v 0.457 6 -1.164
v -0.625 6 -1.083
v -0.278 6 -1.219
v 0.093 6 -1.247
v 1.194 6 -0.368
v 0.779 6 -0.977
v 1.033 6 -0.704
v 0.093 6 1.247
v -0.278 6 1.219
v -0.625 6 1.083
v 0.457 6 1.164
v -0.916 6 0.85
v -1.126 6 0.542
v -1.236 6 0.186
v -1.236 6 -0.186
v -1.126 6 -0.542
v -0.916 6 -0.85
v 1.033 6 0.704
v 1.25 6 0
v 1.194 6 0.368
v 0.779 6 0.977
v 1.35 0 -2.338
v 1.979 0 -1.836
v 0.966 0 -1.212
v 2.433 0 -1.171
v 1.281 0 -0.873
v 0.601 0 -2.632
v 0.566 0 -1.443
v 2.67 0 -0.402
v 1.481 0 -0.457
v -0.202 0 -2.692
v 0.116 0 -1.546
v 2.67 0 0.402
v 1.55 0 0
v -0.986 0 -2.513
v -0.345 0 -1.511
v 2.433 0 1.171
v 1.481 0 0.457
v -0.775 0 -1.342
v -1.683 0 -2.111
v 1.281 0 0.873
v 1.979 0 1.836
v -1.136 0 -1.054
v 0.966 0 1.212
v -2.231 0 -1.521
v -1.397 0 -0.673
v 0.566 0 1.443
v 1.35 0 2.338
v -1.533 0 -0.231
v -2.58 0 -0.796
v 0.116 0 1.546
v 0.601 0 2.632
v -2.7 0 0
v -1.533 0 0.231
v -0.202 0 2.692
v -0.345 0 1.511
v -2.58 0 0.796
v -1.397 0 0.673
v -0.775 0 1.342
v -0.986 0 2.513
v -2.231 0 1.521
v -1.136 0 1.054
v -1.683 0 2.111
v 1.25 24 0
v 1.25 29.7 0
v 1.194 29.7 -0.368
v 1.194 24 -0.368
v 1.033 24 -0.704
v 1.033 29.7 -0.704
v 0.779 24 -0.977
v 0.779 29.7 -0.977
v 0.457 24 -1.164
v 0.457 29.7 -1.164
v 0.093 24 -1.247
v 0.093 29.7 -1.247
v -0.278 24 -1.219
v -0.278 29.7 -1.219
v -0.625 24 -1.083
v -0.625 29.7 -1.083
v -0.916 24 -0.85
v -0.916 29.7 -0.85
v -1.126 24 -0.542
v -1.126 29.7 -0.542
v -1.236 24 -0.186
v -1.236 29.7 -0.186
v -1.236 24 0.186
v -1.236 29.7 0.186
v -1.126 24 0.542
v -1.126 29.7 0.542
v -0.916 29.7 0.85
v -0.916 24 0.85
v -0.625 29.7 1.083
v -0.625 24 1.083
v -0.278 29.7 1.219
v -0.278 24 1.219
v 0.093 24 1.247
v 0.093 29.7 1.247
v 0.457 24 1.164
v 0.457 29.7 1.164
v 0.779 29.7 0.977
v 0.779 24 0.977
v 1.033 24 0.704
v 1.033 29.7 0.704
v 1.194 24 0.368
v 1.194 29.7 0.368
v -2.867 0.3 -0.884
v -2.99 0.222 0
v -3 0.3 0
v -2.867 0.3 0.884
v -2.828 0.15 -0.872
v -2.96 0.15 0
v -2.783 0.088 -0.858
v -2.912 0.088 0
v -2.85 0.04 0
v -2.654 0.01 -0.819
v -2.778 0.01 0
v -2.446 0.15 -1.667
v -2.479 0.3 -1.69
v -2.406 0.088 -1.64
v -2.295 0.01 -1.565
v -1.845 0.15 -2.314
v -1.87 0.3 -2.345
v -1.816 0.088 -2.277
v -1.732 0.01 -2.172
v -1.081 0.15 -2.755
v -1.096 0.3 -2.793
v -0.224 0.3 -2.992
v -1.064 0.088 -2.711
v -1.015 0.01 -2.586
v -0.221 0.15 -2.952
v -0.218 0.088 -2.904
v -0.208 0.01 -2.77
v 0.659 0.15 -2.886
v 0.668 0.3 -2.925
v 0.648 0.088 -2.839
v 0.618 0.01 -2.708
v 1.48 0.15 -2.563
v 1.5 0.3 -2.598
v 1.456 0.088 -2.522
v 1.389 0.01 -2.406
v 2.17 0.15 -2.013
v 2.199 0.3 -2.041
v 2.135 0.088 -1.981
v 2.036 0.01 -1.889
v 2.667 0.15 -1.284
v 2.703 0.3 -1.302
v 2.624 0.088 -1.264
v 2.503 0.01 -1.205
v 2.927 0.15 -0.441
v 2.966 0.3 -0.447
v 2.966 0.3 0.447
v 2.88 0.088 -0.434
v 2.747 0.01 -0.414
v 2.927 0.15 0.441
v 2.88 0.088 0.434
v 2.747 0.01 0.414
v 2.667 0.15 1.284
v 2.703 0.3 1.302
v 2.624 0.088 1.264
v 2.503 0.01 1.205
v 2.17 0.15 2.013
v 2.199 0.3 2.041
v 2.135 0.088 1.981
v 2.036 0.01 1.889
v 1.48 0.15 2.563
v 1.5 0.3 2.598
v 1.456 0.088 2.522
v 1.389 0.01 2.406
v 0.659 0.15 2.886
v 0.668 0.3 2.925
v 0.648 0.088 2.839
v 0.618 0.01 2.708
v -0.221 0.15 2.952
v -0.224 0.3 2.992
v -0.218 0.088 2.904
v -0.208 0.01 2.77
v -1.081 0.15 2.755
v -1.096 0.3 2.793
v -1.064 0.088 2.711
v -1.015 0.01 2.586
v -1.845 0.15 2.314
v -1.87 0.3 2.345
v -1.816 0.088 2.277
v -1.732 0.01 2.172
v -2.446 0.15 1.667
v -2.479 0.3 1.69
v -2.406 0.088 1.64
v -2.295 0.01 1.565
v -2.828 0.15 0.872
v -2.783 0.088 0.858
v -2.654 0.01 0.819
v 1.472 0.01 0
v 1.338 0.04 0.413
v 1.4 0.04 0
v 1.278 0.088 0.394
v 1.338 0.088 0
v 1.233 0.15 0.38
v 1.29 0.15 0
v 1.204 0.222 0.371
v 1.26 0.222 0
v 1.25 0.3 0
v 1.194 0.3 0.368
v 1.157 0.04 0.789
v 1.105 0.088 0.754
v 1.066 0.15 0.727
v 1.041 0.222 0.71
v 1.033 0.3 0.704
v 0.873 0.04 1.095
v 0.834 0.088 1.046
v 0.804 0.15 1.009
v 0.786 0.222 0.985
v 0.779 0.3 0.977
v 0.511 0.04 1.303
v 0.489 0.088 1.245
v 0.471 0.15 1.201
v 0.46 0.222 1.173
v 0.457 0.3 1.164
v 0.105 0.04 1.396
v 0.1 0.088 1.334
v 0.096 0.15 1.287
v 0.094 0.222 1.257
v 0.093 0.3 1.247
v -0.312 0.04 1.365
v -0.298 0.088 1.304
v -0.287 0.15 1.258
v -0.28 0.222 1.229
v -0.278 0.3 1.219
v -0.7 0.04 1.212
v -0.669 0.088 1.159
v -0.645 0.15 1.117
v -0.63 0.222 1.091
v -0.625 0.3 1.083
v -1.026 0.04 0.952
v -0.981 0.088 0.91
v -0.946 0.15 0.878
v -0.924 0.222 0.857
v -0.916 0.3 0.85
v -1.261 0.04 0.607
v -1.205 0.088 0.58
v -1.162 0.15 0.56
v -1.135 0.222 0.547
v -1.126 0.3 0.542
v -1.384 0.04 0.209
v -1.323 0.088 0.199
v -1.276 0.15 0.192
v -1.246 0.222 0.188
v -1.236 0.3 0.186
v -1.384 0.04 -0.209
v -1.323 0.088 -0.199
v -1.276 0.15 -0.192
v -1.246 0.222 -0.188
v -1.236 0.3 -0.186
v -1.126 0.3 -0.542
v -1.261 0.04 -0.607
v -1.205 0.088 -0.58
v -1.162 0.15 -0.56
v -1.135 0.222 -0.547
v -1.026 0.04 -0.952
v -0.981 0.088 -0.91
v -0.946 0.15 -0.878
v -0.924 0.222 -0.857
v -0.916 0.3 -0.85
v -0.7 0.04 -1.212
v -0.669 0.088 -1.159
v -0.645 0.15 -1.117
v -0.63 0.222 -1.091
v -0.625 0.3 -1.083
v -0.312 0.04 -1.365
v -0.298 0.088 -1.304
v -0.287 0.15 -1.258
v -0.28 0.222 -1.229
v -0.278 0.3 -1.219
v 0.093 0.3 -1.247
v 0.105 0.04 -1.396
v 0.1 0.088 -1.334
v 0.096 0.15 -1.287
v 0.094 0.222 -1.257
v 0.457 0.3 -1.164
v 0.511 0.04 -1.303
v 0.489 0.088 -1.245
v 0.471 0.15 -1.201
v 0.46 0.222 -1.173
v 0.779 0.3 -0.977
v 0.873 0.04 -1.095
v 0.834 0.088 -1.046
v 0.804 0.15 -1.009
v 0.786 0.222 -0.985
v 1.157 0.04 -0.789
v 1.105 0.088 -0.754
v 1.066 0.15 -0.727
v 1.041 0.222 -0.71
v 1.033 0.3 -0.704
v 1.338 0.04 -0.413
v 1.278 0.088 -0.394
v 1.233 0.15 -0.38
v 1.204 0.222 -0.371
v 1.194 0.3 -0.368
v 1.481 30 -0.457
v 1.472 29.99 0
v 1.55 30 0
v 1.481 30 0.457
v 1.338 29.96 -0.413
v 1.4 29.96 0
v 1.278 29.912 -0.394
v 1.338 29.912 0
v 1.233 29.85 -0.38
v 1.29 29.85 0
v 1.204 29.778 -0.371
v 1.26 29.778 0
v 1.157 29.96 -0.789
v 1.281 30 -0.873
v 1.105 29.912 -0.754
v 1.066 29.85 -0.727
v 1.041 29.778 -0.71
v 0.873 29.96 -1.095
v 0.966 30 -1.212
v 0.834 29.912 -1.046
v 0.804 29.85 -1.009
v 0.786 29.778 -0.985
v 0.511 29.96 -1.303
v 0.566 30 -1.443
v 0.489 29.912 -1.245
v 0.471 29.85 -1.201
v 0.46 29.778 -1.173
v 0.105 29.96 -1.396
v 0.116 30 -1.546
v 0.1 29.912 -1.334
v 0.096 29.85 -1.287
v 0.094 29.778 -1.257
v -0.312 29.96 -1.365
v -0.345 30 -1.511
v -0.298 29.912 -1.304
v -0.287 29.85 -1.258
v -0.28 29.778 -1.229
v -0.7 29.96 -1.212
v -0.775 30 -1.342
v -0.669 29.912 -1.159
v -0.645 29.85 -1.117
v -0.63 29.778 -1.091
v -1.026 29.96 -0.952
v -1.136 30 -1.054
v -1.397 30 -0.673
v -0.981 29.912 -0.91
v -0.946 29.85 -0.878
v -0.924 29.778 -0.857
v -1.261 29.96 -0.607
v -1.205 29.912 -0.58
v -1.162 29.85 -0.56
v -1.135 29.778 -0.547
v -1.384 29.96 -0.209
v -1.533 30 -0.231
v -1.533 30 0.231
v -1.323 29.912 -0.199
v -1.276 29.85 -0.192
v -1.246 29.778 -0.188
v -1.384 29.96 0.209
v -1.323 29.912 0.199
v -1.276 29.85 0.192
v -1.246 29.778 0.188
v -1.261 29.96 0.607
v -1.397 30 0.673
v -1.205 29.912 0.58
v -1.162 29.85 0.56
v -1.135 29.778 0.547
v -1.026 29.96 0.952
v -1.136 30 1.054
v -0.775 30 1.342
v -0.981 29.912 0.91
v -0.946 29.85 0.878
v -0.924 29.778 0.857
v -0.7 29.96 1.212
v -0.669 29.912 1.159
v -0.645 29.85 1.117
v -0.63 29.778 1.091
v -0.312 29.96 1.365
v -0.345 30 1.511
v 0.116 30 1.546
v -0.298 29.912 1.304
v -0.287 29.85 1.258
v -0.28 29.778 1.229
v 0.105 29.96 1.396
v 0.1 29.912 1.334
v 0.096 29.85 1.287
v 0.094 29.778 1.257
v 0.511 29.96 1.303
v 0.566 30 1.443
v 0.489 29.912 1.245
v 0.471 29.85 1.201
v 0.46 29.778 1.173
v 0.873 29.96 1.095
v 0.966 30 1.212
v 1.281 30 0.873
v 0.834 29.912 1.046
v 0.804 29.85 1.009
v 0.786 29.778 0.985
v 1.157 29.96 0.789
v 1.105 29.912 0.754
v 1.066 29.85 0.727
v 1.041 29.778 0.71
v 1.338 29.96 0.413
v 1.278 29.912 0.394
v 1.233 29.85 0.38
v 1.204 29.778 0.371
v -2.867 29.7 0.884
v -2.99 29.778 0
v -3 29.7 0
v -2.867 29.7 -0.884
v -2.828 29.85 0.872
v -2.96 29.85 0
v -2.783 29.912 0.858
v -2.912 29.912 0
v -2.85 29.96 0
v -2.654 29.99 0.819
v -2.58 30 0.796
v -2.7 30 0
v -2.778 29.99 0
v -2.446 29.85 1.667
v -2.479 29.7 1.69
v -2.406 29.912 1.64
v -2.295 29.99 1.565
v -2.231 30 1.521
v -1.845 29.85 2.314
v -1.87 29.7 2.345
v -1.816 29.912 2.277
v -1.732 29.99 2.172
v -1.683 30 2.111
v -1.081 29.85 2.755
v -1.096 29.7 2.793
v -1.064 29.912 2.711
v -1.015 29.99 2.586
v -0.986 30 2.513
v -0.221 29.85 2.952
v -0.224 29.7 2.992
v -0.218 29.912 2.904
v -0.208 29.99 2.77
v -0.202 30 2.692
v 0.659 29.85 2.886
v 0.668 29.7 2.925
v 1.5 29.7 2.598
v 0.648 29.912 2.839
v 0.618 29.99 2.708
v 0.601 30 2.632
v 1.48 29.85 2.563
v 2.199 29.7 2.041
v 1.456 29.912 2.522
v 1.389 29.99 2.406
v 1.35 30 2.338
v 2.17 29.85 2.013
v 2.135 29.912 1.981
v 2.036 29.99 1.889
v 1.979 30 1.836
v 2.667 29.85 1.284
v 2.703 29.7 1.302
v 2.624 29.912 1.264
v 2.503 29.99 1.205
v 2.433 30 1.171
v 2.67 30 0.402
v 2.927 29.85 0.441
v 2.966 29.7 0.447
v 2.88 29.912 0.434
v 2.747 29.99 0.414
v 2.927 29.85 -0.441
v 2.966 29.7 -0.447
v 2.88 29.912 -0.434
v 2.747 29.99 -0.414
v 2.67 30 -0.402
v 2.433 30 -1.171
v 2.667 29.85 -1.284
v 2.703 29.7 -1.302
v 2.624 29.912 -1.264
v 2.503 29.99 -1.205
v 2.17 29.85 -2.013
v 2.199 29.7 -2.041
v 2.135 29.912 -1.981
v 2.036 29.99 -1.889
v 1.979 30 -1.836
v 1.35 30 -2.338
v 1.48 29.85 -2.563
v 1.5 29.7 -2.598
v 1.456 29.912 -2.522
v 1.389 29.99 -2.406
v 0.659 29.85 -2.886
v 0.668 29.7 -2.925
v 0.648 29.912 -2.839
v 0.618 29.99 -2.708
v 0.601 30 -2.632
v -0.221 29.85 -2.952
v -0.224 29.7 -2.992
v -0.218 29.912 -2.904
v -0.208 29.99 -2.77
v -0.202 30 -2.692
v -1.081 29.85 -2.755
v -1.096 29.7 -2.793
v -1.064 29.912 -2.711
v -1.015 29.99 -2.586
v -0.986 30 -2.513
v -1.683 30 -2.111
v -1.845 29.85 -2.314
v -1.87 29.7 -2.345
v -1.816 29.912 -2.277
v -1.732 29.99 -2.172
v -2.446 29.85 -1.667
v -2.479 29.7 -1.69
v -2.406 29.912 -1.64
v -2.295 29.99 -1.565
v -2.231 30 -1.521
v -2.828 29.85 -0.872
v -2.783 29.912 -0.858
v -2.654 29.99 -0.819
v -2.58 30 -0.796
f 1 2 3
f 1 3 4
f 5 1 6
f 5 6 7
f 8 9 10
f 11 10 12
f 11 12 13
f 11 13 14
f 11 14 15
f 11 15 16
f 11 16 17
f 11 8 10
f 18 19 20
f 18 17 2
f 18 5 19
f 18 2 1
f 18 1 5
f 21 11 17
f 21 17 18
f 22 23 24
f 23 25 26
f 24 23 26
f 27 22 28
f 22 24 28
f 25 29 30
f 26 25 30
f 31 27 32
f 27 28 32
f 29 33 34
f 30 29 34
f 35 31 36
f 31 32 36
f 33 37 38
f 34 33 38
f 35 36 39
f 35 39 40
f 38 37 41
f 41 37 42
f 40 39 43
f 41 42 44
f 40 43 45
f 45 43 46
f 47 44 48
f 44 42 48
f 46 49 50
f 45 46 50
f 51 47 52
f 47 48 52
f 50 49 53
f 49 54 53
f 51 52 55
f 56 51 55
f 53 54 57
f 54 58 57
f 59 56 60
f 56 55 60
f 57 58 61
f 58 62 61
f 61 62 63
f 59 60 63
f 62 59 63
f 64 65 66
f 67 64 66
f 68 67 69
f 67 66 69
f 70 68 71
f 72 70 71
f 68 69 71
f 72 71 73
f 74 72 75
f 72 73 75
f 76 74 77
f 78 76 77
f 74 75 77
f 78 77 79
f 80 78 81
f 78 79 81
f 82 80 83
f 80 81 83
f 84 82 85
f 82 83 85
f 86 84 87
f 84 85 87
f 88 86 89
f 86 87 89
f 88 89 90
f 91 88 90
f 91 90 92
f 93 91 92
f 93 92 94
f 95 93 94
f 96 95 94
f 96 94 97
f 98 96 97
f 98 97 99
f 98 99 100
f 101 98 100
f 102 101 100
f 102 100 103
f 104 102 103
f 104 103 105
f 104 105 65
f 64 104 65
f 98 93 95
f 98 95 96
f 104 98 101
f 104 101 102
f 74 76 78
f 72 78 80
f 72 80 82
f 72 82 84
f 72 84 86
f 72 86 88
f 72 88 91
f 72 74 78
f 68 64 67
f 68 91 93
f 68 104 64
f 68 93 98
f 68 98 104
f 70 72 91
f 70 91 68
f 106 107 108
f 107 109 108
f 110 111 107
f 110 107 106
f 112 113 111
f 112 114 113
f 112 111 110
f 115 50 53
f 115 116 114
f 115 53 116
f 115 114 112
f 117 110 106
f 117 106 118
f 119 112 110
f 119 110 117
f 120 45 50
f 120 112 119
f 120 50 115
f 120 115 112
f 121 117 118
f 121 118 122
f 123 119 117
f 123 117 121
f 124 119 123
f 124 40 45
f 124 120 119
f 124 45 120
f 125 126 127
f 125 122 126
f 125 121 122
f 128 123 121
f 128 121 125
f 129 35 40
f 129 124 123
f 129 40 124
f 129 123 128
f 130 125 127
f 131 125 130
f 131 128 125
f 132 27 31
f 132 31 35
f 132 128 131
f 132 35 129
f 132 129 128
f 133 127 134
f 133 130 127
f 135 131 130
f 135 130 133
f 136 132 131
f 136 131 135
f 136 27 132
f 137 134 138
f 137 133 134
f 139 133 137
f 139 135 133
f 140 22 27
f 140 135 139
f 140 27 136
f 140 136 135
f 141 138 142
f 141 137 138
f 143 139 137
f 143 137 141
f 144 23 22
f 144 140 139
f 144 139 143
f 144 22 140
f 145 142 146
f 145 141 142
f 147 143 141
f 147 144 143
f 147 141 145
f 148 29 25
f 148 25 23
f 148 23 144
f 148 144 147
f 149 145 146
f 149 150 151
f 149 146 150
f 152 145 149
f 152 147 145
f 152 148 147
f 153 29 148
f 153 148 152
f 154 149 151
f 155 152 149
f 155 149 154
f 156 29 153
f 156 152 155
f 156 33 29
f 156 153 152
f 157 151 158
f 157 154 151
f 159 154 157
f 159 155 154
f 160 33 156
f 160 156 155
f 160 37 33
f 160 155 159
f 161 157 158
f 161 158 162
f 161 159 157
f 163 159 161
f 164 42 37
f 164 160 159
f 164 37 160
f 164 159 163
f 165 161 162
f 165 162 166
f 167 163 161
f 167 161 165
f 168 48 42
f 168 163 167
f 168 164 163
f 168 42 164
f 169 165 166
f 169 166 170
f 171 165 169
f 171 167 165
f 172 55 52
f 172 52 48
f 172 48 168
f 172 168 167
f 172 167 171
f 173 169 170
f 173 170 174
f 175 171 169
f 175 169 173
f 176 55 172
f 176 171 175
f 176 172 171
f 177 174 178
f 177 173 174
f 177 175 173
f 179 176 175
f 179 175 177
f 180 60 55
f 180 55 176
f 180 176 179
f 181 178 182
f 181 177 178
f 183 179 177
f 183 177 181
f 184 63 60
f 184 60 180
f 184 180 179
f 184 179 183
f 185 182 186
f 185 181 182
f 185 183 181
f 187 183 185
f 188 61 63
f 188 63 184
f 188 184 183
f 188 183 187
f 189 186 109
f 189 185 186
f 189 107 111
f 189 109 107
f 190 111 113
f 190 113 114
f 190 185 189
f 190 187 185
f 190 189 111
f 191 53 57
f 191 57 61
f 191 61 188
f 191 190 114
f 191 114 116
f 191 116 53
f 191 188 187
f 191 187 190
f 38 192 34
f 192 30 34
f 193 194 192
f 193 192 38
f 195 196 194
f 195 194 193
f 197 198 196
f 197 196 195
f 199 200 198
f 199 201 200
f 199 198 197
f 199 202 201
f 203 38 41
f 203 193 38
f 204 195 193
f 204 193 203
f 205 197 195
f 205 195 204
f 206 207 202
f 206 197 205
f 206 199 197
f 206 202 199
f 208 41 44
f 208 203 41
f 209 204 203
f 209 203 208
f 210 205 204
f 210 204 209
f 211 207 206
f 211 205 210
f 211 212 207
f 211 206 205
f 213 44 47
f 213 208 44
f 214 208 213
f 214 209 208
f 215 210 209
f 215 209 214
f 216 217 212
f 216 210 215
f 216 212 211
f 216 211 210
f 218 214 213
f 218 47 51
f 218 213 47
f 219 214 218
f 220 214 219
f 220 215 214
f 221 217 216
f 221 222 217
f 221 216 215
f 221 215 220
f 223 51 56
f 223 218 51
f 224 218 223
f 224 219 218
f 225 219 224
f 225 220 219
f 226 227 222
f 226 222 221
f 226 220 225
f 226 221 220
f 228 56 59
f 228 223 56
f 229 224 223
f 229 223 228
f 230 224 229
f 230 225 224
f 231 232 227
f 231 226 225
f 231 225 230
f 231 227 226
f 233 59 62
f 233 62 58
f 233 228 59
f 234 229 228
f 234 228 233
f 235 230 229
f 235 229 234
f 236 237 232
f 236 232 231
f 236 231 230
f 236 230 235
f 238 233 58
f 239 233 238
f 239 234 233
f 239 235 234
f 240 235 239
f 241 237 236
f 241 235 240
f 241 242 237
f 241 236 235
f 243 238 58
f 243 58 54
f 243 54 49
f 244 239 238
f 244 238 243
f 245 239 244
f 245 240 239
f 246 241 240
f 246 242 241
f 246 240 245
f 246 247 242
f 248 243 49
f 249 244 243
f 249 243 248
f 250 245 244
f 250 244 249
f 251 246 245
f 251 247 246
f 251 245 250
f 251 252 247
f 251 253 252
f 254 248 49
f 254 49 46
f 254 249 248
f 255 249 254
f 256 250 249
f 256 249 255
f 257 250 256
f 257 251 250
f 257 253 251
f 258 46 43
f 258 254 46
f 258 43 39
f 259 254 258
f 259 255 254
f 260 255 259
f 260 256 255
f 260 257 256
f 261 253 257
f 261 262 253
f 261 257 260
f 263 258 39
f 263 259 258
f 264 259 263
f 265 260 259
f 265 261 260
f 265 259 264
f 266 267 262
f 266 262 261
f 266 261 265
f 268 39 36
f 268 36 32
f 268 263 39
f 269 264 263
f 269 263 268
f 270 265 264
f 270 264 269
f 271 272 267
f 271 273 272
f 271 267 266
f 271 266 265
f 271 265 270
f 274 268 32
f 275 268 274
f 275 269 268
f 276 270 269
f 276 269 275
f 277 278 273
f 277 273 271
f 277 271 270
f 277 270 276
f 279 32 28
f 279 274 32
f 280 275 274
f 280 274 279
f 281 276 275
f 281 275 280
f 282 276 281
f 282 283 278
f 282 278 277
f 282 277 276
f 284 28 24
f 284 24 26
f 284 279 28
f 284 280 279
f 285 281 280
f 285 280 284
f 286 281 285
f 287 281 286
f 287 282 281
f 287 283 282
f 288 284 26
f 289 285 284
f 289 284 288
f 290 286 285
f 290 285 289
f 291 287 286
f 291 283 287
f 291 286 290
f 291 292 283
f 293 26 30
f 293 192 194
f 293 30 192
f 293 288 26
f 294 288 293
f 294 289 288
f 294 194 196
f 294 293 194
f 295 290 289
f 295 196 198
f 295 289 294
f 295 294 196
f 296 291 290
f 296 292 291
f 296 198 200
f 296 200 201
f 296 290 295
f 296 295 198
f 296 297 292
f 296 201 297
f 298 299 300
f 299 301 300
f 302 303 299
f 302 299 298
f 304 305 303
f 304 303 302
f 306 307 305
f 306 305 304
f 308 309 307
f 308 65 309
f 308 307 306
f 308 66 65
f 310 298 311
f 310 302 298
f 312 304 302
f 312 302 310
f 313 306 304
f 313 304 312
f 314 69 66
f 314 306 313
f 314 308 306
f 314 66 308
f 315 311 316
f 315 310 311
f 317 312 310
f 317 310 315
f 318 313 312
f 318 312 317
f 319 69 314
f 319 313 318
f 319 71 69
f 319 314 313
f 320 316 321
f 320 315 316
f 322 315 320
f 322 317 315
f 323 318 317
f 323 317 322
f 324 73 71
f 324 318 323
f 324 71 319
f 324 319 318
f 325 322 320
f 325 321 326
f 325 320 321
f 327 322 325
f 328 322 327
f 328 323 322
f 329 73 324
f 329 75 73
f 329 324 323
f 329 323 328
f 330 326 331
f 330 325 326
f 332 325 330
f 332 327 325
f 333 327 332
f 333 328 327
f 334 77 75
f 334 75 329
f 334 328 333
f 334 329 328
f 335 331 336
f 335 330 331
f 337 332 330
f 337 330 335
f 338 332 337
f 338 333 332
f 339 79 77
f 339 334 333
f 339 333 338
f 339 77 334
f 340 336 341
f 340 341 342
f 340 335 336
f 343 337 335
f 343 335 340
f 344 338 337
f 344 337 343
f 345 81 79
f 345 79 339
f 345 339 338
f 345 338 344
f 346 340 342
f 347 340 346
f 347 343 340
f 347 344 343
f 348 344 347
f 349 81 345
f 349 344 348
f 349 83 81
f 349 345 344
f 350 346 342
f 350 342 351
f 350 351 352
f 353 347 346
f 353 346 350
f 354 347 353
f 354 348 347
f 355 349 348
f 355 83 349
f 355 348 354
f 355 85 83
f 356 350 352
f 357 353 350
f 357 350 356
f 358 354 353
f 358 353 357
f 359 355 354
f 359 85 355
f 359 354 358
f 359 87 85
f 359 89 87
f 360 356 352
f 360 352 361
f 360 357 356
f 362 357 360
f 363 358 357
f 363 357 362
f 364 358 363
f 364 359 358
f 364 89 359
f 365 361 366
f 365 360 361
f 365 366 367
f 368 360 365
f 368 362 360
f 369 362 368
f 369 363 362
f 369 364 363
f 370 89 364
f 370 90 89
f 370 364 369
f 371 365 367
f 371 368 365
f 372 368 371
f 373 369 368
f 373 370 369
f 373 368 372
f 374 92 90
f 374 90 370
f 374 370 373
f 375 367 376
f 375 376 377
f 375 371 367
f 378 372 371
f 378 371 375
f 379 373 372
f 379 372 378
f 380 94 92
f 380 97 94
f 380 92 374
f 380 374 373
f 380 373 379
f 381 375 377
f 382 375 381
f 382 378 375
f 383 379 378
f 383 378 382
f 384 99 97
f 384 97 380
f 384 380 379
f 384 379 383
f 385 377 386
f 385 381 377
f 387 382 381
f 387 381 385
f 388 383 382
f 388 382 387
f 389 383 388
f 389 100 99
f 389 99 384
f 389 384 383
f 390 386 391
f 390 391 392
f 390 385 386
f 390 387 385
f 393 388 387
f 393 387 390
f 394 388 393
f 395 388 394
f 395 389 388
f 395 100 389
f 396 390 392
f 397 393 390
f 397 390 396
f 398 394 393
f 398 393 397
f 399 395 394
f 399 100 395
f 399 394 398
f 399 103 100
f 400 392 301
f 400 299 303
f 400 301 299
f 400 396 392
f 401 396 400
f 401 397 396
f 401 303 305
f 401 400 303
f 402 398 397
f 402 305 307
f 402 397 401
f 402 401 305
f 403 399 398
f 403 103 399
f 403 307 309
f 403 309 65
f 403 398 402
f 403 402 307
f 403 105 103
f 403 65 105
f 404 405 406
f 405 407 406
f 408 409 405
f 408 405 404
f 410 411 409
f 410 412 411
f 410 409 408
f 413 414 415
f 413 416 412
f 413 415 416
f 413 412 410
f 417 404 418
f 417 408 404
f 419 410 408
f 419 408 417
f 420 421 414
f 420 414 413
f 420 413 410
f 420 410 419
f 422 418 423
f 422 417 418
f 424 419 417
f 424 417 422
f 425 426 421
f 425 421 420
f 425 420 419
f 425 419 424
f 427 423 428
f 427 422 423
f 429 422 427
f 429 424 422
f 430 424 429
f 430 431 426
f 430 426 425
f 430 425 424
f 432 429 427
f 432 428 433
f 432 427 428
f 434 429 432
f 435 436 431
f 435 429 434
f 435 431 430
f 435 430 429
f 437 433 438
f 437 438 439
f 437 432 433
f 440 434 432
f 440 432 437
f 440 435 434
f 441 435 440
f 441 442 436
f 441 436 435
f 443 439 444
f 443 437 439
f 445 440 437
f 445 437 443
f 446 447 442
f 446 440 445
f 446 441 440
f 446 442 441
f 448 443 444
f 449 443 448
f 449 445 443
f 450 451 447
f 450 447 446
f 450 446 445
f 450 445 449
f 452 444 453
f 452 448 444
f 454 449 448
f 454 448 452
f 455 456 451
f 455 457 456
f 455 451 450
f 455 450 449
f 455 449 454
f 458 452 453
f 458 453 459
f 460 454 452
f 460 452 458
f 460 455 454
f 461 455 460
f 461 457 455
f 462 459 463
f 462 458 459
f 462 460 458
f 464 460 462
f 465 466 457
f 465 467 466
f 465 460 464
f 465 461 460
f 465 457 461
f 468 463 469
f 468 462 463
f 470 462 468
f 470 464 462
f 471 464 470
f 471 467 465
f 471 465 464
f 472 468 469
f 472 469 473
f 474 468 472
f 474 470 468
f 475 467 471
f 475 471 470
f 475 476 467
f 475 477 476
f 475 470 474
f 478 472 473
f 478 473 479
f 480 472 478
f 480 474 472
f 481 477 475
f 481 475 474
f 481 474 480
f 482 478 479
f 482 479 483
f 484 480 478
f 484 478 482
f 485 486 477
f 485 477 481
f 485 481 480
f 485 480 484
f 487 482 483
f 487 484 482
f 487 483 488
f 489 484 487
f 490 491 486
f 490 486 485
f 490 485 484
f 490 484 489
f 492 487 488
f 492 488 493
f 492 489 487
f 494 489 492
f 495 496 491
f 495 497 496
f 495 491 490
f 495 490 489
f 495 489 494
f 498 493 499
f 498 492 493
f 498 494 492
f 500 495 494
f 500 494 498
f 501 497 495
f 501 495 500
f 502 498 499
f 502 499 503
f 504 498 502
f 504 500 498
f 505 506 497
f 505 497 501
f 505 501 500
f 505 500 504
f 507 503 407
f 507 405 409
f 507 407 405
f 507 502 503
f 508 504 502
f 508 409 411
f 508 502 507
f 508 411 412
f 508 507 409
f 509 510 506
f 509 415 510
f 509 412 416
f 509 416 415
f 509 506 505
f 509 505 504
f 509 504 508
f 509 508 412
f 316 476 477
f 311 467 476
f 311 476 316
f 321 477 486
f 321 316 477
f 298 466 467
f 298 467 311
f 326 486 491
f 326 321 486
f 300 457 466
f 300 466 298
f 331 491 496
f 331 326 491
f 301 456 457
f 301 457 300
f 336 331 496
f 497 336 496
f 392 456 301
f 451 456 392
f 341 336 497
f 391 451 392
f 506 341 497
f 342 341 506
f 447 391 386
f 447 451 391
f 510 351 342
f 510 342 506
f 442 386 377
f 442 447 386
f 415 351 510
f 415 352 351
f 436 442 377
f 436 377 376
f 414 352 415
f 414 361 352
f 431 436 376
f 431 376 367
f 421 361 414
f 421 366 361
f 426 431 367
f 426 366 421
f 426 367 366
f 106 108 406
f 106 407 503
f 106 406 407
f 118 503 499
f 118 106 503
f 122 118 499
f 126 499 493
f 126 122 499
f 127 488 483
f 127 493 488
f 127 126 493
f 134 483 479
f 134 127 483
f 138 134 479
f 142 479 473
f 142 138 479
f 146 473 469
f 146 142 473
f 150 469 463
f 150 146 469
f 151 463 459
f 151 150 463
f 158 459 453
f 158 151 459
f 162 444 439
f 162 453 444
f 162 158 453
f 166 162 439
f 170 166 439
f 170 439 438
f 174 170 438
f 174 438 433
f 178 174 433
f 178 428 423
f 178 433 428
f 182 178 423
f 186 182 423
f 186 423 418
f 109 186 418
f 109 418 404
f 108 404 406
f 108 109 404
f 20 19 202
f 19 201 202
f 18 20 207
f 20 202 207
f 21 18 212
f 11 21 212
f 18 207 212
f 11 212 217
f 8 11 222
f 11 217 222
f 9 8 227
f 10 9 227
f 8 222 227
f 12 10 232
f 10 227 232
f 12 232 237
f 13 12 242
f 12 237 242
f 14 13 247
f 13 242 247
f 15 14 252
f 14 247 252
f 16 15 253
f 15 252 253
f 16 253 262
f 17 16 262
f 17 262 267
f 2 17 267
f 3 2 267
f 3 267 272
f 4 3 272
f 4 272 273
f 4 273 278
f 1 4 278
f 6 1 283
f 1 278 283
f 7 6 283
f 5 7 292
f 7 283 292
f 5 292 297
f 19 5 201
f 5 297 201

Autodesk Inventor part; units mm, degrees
ref_plane "YZ Plane" through (0, 0, 0) normal (1, 0, 0) x (0, 1, 0)
ref_plane "XZ Plane" through (0, 0, 0) normal (0, 1, 0) x (-1, 0, 0)
ref_plane "XY Plane" through (0, 0, 0) normal (0, 0, 1) x (1, 0, 0)
sketch "スケッチ1" plane through (0, 0, 0) normal (0, 1, 0) x (-1, 0, 0)
  circle A0 centre (0, 0) radius 3
  dimension "d0" = 6
extrude "押し出し1" add sketch "スケッチ1" along normal blind 30
sketch "スケッチ2" plane through (0, 30, 0) normal (0, 1, 0) x (1, 0, 0)
  circle A0 centre (0, 0) radius 1.25
  dimension "d3" = 2.5
extrude "押し出し2" cut sketch "スケッチ2" against normal blind 6
sketch "スケッチ3" plane through (0, 0, 0) normal (0, -1, 0) x (1, 0, 0)
  circle A0 centre (0, 0) radius 1.25 projected
  circle A1 centre (0, 0) radius 1.25
  dimension "d6" = 2.5
extrude "押し出し3" cut sketch "スケッチ3" against normal blind 6
thread "ねじ1" size "M3x0.5" class "6H" standard "ISO Metric profile" full length
fillet "フィレット1" radius 0.3 4 edges at (3, 30, 0) (-1.25, 30, 0) (-1.25, 0, 0) (3, 0, 0)
properties part number "ARL-330KE"
